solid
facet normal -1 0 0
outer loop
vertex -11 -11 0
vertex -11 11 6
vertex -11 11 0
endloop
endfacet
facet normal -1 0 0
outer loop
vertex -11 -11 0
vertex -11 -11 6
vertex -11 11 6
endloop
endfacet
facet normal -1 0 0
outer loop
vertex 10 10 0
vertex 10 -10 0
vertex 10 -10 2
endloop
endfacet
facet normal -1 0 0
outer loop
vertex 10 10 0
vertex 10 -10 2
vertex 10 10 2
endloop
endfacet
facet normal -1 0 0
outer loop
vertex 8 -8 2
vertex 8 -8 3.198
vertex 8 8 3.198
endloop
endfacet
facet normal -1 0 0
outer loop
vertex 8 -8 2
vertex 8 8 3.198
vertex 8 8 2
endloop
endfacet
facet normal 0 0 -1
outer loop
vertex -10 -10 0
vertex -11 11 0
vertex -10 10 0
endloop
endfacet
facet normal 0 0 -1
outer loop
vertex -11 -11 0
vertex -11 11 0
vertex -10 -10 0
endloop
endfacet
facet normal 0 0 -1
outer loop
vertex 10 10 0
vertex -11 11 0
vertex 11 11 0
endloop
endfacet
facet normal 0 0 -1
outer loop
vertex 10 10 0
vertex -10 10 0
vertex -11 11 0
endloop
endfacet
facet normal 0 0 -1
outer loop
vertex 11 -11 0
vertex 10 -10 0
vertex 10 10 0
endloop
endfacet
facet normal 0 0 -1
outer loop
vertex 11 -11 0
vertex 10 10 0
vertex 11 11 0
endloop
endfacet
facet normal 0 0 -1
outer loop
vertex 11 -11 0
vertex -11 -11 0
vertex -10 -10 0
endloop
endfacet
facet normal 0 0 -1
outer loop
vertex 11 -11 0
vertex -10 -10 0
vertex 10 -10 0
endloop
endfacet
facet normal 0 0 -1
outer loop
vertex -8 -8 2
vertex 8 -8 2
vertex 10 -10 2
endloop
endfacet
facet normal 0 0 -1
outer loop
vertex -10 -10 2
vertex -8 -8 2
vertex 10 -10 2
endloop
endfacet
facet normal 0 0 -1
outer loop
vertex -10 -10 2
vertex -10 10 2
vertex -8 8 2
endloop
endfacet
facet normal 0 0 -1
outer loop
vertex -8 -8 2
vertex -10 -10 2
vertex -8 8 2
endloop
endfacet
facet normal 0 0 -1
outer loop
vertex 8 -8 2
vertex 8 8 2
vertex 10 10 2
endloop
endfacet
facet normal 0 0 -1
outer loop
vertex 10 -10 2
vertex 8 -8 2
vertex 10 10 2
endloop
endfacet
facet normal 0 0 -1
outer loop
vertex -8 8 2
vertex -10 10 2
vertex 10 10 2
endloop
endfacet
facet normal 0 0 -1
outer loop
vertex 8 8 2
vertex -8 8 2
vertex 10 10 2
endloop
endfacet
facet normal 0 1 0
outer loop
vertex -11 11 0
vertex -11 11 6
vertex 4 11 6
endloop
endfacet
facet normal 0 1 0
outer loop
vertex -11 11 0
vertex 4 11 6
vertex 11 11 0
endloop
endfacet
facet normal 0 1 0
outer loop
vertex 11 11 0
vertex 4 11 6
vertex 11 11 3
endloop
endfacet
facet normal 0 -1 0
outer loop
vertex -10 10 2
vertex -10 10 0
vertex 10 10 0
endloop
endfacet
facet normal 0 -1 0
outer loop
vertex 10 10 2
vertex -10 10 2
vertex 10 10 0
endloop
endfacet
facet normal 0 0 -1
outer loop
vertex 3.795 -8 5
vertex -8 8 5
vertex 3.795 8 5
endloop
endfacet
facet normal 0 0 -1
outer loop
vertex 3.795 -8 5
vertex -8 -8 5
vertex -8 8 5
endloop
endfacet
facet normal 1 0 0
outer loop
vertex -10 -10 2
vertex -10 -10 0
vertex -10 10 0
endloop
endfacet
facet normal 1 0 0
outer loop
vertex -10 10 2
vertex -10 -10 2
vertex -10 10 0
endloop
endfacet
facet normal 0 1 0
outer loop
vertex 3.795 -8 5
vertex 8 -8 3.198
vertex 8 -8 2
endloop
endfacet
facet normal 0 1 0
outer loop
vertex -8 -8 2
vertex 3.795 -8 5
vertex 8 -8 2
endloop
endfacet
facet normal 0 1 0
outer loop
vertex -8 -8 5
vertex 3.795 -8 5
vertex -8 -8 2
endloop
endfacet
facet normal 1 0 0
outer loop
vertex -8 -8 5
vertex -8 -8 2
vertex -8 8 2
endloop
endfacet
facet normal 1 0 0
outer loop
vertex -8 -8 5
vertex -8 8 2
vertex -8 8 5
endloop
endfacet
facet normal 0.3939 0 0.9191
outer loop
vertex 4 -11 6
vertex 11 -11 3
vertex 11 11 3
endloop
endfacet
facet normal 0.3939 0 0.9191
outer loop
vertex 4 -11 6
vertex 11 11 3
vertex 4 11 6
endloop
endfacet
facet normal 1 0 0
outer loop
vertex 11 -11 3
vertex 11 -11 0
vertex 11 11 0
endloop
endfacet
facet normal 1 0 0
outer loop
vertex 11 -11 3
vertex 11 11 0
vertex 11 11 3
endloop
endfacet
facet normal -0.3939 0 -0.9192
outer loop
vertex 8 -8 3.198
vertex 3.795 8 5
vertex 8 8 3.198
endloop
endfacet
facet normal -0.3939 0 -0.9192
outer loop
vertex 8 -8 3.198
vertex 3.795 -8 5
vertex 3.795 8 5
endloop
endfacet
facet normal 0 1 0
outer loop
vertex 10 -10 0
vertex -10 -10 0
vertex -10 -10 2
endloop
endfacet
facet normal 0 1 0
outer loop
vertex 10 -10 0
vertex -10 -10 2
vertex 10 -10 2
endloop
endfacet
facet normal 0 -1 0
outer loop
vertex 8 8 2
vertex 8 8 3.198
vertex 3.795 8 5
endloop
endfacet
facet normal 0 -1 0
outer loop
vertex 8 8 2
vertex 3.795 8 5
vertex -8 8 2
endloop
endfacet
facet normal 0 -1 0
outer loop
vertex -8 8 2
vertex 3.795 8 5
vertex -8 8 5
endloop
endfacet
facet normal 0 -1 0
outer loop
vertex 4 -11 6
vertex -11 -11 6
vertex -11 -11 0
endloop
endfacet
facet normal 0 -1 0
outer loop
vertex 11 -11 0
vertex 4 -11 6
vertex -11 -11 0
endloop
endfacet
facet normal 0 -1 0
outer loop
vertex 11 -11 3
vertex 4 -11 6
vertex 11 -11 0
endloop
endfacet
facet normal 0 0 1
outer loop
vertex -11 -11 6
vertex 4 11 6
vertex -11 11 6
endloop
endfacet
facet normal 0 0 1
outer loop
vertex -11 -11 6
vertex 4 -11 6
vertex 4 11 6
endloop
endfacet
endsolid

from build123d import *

# Parameters (mm, degrees)
PAD_DEPTH       = 11
SKETCH001_W     = 20
SKETCH001_H     = 20
POCKET_DEPTH    = 2
POCKET001_DEPTH = 8


with BuildPart() as part:
    # Sketch → Pad (new body, symmetric)
    with BuildSketch(Plane.XZ):
        Polygon((-11, 0), (11, 0), (11, 3), (4, 6), (-11, 6), align=None)
    extrude(amount=PAD_DEPTH, both=True)

    # Sketch001 → Pocket (cut)
    with BuildSketch(Plane.XY):
        Rectangle(SKETCH001_W, SKETCH001_H)
    extrude(amount=POCKET_DEPTH, mode=Mode.SUBTRACT)

    # Sketch002 → Pocket001 (cut, symmetric)
    with BuildSketch(Plane.XZ):
        Polygon((-8, -1), (-8, 5), (3.794742, 5), (8, 3.197747), (8, -1), align=None)
    extrude(amount=POCKET001_DEPTH, both=True, mode=Mode.SUBTRACT)


solid = part.part
